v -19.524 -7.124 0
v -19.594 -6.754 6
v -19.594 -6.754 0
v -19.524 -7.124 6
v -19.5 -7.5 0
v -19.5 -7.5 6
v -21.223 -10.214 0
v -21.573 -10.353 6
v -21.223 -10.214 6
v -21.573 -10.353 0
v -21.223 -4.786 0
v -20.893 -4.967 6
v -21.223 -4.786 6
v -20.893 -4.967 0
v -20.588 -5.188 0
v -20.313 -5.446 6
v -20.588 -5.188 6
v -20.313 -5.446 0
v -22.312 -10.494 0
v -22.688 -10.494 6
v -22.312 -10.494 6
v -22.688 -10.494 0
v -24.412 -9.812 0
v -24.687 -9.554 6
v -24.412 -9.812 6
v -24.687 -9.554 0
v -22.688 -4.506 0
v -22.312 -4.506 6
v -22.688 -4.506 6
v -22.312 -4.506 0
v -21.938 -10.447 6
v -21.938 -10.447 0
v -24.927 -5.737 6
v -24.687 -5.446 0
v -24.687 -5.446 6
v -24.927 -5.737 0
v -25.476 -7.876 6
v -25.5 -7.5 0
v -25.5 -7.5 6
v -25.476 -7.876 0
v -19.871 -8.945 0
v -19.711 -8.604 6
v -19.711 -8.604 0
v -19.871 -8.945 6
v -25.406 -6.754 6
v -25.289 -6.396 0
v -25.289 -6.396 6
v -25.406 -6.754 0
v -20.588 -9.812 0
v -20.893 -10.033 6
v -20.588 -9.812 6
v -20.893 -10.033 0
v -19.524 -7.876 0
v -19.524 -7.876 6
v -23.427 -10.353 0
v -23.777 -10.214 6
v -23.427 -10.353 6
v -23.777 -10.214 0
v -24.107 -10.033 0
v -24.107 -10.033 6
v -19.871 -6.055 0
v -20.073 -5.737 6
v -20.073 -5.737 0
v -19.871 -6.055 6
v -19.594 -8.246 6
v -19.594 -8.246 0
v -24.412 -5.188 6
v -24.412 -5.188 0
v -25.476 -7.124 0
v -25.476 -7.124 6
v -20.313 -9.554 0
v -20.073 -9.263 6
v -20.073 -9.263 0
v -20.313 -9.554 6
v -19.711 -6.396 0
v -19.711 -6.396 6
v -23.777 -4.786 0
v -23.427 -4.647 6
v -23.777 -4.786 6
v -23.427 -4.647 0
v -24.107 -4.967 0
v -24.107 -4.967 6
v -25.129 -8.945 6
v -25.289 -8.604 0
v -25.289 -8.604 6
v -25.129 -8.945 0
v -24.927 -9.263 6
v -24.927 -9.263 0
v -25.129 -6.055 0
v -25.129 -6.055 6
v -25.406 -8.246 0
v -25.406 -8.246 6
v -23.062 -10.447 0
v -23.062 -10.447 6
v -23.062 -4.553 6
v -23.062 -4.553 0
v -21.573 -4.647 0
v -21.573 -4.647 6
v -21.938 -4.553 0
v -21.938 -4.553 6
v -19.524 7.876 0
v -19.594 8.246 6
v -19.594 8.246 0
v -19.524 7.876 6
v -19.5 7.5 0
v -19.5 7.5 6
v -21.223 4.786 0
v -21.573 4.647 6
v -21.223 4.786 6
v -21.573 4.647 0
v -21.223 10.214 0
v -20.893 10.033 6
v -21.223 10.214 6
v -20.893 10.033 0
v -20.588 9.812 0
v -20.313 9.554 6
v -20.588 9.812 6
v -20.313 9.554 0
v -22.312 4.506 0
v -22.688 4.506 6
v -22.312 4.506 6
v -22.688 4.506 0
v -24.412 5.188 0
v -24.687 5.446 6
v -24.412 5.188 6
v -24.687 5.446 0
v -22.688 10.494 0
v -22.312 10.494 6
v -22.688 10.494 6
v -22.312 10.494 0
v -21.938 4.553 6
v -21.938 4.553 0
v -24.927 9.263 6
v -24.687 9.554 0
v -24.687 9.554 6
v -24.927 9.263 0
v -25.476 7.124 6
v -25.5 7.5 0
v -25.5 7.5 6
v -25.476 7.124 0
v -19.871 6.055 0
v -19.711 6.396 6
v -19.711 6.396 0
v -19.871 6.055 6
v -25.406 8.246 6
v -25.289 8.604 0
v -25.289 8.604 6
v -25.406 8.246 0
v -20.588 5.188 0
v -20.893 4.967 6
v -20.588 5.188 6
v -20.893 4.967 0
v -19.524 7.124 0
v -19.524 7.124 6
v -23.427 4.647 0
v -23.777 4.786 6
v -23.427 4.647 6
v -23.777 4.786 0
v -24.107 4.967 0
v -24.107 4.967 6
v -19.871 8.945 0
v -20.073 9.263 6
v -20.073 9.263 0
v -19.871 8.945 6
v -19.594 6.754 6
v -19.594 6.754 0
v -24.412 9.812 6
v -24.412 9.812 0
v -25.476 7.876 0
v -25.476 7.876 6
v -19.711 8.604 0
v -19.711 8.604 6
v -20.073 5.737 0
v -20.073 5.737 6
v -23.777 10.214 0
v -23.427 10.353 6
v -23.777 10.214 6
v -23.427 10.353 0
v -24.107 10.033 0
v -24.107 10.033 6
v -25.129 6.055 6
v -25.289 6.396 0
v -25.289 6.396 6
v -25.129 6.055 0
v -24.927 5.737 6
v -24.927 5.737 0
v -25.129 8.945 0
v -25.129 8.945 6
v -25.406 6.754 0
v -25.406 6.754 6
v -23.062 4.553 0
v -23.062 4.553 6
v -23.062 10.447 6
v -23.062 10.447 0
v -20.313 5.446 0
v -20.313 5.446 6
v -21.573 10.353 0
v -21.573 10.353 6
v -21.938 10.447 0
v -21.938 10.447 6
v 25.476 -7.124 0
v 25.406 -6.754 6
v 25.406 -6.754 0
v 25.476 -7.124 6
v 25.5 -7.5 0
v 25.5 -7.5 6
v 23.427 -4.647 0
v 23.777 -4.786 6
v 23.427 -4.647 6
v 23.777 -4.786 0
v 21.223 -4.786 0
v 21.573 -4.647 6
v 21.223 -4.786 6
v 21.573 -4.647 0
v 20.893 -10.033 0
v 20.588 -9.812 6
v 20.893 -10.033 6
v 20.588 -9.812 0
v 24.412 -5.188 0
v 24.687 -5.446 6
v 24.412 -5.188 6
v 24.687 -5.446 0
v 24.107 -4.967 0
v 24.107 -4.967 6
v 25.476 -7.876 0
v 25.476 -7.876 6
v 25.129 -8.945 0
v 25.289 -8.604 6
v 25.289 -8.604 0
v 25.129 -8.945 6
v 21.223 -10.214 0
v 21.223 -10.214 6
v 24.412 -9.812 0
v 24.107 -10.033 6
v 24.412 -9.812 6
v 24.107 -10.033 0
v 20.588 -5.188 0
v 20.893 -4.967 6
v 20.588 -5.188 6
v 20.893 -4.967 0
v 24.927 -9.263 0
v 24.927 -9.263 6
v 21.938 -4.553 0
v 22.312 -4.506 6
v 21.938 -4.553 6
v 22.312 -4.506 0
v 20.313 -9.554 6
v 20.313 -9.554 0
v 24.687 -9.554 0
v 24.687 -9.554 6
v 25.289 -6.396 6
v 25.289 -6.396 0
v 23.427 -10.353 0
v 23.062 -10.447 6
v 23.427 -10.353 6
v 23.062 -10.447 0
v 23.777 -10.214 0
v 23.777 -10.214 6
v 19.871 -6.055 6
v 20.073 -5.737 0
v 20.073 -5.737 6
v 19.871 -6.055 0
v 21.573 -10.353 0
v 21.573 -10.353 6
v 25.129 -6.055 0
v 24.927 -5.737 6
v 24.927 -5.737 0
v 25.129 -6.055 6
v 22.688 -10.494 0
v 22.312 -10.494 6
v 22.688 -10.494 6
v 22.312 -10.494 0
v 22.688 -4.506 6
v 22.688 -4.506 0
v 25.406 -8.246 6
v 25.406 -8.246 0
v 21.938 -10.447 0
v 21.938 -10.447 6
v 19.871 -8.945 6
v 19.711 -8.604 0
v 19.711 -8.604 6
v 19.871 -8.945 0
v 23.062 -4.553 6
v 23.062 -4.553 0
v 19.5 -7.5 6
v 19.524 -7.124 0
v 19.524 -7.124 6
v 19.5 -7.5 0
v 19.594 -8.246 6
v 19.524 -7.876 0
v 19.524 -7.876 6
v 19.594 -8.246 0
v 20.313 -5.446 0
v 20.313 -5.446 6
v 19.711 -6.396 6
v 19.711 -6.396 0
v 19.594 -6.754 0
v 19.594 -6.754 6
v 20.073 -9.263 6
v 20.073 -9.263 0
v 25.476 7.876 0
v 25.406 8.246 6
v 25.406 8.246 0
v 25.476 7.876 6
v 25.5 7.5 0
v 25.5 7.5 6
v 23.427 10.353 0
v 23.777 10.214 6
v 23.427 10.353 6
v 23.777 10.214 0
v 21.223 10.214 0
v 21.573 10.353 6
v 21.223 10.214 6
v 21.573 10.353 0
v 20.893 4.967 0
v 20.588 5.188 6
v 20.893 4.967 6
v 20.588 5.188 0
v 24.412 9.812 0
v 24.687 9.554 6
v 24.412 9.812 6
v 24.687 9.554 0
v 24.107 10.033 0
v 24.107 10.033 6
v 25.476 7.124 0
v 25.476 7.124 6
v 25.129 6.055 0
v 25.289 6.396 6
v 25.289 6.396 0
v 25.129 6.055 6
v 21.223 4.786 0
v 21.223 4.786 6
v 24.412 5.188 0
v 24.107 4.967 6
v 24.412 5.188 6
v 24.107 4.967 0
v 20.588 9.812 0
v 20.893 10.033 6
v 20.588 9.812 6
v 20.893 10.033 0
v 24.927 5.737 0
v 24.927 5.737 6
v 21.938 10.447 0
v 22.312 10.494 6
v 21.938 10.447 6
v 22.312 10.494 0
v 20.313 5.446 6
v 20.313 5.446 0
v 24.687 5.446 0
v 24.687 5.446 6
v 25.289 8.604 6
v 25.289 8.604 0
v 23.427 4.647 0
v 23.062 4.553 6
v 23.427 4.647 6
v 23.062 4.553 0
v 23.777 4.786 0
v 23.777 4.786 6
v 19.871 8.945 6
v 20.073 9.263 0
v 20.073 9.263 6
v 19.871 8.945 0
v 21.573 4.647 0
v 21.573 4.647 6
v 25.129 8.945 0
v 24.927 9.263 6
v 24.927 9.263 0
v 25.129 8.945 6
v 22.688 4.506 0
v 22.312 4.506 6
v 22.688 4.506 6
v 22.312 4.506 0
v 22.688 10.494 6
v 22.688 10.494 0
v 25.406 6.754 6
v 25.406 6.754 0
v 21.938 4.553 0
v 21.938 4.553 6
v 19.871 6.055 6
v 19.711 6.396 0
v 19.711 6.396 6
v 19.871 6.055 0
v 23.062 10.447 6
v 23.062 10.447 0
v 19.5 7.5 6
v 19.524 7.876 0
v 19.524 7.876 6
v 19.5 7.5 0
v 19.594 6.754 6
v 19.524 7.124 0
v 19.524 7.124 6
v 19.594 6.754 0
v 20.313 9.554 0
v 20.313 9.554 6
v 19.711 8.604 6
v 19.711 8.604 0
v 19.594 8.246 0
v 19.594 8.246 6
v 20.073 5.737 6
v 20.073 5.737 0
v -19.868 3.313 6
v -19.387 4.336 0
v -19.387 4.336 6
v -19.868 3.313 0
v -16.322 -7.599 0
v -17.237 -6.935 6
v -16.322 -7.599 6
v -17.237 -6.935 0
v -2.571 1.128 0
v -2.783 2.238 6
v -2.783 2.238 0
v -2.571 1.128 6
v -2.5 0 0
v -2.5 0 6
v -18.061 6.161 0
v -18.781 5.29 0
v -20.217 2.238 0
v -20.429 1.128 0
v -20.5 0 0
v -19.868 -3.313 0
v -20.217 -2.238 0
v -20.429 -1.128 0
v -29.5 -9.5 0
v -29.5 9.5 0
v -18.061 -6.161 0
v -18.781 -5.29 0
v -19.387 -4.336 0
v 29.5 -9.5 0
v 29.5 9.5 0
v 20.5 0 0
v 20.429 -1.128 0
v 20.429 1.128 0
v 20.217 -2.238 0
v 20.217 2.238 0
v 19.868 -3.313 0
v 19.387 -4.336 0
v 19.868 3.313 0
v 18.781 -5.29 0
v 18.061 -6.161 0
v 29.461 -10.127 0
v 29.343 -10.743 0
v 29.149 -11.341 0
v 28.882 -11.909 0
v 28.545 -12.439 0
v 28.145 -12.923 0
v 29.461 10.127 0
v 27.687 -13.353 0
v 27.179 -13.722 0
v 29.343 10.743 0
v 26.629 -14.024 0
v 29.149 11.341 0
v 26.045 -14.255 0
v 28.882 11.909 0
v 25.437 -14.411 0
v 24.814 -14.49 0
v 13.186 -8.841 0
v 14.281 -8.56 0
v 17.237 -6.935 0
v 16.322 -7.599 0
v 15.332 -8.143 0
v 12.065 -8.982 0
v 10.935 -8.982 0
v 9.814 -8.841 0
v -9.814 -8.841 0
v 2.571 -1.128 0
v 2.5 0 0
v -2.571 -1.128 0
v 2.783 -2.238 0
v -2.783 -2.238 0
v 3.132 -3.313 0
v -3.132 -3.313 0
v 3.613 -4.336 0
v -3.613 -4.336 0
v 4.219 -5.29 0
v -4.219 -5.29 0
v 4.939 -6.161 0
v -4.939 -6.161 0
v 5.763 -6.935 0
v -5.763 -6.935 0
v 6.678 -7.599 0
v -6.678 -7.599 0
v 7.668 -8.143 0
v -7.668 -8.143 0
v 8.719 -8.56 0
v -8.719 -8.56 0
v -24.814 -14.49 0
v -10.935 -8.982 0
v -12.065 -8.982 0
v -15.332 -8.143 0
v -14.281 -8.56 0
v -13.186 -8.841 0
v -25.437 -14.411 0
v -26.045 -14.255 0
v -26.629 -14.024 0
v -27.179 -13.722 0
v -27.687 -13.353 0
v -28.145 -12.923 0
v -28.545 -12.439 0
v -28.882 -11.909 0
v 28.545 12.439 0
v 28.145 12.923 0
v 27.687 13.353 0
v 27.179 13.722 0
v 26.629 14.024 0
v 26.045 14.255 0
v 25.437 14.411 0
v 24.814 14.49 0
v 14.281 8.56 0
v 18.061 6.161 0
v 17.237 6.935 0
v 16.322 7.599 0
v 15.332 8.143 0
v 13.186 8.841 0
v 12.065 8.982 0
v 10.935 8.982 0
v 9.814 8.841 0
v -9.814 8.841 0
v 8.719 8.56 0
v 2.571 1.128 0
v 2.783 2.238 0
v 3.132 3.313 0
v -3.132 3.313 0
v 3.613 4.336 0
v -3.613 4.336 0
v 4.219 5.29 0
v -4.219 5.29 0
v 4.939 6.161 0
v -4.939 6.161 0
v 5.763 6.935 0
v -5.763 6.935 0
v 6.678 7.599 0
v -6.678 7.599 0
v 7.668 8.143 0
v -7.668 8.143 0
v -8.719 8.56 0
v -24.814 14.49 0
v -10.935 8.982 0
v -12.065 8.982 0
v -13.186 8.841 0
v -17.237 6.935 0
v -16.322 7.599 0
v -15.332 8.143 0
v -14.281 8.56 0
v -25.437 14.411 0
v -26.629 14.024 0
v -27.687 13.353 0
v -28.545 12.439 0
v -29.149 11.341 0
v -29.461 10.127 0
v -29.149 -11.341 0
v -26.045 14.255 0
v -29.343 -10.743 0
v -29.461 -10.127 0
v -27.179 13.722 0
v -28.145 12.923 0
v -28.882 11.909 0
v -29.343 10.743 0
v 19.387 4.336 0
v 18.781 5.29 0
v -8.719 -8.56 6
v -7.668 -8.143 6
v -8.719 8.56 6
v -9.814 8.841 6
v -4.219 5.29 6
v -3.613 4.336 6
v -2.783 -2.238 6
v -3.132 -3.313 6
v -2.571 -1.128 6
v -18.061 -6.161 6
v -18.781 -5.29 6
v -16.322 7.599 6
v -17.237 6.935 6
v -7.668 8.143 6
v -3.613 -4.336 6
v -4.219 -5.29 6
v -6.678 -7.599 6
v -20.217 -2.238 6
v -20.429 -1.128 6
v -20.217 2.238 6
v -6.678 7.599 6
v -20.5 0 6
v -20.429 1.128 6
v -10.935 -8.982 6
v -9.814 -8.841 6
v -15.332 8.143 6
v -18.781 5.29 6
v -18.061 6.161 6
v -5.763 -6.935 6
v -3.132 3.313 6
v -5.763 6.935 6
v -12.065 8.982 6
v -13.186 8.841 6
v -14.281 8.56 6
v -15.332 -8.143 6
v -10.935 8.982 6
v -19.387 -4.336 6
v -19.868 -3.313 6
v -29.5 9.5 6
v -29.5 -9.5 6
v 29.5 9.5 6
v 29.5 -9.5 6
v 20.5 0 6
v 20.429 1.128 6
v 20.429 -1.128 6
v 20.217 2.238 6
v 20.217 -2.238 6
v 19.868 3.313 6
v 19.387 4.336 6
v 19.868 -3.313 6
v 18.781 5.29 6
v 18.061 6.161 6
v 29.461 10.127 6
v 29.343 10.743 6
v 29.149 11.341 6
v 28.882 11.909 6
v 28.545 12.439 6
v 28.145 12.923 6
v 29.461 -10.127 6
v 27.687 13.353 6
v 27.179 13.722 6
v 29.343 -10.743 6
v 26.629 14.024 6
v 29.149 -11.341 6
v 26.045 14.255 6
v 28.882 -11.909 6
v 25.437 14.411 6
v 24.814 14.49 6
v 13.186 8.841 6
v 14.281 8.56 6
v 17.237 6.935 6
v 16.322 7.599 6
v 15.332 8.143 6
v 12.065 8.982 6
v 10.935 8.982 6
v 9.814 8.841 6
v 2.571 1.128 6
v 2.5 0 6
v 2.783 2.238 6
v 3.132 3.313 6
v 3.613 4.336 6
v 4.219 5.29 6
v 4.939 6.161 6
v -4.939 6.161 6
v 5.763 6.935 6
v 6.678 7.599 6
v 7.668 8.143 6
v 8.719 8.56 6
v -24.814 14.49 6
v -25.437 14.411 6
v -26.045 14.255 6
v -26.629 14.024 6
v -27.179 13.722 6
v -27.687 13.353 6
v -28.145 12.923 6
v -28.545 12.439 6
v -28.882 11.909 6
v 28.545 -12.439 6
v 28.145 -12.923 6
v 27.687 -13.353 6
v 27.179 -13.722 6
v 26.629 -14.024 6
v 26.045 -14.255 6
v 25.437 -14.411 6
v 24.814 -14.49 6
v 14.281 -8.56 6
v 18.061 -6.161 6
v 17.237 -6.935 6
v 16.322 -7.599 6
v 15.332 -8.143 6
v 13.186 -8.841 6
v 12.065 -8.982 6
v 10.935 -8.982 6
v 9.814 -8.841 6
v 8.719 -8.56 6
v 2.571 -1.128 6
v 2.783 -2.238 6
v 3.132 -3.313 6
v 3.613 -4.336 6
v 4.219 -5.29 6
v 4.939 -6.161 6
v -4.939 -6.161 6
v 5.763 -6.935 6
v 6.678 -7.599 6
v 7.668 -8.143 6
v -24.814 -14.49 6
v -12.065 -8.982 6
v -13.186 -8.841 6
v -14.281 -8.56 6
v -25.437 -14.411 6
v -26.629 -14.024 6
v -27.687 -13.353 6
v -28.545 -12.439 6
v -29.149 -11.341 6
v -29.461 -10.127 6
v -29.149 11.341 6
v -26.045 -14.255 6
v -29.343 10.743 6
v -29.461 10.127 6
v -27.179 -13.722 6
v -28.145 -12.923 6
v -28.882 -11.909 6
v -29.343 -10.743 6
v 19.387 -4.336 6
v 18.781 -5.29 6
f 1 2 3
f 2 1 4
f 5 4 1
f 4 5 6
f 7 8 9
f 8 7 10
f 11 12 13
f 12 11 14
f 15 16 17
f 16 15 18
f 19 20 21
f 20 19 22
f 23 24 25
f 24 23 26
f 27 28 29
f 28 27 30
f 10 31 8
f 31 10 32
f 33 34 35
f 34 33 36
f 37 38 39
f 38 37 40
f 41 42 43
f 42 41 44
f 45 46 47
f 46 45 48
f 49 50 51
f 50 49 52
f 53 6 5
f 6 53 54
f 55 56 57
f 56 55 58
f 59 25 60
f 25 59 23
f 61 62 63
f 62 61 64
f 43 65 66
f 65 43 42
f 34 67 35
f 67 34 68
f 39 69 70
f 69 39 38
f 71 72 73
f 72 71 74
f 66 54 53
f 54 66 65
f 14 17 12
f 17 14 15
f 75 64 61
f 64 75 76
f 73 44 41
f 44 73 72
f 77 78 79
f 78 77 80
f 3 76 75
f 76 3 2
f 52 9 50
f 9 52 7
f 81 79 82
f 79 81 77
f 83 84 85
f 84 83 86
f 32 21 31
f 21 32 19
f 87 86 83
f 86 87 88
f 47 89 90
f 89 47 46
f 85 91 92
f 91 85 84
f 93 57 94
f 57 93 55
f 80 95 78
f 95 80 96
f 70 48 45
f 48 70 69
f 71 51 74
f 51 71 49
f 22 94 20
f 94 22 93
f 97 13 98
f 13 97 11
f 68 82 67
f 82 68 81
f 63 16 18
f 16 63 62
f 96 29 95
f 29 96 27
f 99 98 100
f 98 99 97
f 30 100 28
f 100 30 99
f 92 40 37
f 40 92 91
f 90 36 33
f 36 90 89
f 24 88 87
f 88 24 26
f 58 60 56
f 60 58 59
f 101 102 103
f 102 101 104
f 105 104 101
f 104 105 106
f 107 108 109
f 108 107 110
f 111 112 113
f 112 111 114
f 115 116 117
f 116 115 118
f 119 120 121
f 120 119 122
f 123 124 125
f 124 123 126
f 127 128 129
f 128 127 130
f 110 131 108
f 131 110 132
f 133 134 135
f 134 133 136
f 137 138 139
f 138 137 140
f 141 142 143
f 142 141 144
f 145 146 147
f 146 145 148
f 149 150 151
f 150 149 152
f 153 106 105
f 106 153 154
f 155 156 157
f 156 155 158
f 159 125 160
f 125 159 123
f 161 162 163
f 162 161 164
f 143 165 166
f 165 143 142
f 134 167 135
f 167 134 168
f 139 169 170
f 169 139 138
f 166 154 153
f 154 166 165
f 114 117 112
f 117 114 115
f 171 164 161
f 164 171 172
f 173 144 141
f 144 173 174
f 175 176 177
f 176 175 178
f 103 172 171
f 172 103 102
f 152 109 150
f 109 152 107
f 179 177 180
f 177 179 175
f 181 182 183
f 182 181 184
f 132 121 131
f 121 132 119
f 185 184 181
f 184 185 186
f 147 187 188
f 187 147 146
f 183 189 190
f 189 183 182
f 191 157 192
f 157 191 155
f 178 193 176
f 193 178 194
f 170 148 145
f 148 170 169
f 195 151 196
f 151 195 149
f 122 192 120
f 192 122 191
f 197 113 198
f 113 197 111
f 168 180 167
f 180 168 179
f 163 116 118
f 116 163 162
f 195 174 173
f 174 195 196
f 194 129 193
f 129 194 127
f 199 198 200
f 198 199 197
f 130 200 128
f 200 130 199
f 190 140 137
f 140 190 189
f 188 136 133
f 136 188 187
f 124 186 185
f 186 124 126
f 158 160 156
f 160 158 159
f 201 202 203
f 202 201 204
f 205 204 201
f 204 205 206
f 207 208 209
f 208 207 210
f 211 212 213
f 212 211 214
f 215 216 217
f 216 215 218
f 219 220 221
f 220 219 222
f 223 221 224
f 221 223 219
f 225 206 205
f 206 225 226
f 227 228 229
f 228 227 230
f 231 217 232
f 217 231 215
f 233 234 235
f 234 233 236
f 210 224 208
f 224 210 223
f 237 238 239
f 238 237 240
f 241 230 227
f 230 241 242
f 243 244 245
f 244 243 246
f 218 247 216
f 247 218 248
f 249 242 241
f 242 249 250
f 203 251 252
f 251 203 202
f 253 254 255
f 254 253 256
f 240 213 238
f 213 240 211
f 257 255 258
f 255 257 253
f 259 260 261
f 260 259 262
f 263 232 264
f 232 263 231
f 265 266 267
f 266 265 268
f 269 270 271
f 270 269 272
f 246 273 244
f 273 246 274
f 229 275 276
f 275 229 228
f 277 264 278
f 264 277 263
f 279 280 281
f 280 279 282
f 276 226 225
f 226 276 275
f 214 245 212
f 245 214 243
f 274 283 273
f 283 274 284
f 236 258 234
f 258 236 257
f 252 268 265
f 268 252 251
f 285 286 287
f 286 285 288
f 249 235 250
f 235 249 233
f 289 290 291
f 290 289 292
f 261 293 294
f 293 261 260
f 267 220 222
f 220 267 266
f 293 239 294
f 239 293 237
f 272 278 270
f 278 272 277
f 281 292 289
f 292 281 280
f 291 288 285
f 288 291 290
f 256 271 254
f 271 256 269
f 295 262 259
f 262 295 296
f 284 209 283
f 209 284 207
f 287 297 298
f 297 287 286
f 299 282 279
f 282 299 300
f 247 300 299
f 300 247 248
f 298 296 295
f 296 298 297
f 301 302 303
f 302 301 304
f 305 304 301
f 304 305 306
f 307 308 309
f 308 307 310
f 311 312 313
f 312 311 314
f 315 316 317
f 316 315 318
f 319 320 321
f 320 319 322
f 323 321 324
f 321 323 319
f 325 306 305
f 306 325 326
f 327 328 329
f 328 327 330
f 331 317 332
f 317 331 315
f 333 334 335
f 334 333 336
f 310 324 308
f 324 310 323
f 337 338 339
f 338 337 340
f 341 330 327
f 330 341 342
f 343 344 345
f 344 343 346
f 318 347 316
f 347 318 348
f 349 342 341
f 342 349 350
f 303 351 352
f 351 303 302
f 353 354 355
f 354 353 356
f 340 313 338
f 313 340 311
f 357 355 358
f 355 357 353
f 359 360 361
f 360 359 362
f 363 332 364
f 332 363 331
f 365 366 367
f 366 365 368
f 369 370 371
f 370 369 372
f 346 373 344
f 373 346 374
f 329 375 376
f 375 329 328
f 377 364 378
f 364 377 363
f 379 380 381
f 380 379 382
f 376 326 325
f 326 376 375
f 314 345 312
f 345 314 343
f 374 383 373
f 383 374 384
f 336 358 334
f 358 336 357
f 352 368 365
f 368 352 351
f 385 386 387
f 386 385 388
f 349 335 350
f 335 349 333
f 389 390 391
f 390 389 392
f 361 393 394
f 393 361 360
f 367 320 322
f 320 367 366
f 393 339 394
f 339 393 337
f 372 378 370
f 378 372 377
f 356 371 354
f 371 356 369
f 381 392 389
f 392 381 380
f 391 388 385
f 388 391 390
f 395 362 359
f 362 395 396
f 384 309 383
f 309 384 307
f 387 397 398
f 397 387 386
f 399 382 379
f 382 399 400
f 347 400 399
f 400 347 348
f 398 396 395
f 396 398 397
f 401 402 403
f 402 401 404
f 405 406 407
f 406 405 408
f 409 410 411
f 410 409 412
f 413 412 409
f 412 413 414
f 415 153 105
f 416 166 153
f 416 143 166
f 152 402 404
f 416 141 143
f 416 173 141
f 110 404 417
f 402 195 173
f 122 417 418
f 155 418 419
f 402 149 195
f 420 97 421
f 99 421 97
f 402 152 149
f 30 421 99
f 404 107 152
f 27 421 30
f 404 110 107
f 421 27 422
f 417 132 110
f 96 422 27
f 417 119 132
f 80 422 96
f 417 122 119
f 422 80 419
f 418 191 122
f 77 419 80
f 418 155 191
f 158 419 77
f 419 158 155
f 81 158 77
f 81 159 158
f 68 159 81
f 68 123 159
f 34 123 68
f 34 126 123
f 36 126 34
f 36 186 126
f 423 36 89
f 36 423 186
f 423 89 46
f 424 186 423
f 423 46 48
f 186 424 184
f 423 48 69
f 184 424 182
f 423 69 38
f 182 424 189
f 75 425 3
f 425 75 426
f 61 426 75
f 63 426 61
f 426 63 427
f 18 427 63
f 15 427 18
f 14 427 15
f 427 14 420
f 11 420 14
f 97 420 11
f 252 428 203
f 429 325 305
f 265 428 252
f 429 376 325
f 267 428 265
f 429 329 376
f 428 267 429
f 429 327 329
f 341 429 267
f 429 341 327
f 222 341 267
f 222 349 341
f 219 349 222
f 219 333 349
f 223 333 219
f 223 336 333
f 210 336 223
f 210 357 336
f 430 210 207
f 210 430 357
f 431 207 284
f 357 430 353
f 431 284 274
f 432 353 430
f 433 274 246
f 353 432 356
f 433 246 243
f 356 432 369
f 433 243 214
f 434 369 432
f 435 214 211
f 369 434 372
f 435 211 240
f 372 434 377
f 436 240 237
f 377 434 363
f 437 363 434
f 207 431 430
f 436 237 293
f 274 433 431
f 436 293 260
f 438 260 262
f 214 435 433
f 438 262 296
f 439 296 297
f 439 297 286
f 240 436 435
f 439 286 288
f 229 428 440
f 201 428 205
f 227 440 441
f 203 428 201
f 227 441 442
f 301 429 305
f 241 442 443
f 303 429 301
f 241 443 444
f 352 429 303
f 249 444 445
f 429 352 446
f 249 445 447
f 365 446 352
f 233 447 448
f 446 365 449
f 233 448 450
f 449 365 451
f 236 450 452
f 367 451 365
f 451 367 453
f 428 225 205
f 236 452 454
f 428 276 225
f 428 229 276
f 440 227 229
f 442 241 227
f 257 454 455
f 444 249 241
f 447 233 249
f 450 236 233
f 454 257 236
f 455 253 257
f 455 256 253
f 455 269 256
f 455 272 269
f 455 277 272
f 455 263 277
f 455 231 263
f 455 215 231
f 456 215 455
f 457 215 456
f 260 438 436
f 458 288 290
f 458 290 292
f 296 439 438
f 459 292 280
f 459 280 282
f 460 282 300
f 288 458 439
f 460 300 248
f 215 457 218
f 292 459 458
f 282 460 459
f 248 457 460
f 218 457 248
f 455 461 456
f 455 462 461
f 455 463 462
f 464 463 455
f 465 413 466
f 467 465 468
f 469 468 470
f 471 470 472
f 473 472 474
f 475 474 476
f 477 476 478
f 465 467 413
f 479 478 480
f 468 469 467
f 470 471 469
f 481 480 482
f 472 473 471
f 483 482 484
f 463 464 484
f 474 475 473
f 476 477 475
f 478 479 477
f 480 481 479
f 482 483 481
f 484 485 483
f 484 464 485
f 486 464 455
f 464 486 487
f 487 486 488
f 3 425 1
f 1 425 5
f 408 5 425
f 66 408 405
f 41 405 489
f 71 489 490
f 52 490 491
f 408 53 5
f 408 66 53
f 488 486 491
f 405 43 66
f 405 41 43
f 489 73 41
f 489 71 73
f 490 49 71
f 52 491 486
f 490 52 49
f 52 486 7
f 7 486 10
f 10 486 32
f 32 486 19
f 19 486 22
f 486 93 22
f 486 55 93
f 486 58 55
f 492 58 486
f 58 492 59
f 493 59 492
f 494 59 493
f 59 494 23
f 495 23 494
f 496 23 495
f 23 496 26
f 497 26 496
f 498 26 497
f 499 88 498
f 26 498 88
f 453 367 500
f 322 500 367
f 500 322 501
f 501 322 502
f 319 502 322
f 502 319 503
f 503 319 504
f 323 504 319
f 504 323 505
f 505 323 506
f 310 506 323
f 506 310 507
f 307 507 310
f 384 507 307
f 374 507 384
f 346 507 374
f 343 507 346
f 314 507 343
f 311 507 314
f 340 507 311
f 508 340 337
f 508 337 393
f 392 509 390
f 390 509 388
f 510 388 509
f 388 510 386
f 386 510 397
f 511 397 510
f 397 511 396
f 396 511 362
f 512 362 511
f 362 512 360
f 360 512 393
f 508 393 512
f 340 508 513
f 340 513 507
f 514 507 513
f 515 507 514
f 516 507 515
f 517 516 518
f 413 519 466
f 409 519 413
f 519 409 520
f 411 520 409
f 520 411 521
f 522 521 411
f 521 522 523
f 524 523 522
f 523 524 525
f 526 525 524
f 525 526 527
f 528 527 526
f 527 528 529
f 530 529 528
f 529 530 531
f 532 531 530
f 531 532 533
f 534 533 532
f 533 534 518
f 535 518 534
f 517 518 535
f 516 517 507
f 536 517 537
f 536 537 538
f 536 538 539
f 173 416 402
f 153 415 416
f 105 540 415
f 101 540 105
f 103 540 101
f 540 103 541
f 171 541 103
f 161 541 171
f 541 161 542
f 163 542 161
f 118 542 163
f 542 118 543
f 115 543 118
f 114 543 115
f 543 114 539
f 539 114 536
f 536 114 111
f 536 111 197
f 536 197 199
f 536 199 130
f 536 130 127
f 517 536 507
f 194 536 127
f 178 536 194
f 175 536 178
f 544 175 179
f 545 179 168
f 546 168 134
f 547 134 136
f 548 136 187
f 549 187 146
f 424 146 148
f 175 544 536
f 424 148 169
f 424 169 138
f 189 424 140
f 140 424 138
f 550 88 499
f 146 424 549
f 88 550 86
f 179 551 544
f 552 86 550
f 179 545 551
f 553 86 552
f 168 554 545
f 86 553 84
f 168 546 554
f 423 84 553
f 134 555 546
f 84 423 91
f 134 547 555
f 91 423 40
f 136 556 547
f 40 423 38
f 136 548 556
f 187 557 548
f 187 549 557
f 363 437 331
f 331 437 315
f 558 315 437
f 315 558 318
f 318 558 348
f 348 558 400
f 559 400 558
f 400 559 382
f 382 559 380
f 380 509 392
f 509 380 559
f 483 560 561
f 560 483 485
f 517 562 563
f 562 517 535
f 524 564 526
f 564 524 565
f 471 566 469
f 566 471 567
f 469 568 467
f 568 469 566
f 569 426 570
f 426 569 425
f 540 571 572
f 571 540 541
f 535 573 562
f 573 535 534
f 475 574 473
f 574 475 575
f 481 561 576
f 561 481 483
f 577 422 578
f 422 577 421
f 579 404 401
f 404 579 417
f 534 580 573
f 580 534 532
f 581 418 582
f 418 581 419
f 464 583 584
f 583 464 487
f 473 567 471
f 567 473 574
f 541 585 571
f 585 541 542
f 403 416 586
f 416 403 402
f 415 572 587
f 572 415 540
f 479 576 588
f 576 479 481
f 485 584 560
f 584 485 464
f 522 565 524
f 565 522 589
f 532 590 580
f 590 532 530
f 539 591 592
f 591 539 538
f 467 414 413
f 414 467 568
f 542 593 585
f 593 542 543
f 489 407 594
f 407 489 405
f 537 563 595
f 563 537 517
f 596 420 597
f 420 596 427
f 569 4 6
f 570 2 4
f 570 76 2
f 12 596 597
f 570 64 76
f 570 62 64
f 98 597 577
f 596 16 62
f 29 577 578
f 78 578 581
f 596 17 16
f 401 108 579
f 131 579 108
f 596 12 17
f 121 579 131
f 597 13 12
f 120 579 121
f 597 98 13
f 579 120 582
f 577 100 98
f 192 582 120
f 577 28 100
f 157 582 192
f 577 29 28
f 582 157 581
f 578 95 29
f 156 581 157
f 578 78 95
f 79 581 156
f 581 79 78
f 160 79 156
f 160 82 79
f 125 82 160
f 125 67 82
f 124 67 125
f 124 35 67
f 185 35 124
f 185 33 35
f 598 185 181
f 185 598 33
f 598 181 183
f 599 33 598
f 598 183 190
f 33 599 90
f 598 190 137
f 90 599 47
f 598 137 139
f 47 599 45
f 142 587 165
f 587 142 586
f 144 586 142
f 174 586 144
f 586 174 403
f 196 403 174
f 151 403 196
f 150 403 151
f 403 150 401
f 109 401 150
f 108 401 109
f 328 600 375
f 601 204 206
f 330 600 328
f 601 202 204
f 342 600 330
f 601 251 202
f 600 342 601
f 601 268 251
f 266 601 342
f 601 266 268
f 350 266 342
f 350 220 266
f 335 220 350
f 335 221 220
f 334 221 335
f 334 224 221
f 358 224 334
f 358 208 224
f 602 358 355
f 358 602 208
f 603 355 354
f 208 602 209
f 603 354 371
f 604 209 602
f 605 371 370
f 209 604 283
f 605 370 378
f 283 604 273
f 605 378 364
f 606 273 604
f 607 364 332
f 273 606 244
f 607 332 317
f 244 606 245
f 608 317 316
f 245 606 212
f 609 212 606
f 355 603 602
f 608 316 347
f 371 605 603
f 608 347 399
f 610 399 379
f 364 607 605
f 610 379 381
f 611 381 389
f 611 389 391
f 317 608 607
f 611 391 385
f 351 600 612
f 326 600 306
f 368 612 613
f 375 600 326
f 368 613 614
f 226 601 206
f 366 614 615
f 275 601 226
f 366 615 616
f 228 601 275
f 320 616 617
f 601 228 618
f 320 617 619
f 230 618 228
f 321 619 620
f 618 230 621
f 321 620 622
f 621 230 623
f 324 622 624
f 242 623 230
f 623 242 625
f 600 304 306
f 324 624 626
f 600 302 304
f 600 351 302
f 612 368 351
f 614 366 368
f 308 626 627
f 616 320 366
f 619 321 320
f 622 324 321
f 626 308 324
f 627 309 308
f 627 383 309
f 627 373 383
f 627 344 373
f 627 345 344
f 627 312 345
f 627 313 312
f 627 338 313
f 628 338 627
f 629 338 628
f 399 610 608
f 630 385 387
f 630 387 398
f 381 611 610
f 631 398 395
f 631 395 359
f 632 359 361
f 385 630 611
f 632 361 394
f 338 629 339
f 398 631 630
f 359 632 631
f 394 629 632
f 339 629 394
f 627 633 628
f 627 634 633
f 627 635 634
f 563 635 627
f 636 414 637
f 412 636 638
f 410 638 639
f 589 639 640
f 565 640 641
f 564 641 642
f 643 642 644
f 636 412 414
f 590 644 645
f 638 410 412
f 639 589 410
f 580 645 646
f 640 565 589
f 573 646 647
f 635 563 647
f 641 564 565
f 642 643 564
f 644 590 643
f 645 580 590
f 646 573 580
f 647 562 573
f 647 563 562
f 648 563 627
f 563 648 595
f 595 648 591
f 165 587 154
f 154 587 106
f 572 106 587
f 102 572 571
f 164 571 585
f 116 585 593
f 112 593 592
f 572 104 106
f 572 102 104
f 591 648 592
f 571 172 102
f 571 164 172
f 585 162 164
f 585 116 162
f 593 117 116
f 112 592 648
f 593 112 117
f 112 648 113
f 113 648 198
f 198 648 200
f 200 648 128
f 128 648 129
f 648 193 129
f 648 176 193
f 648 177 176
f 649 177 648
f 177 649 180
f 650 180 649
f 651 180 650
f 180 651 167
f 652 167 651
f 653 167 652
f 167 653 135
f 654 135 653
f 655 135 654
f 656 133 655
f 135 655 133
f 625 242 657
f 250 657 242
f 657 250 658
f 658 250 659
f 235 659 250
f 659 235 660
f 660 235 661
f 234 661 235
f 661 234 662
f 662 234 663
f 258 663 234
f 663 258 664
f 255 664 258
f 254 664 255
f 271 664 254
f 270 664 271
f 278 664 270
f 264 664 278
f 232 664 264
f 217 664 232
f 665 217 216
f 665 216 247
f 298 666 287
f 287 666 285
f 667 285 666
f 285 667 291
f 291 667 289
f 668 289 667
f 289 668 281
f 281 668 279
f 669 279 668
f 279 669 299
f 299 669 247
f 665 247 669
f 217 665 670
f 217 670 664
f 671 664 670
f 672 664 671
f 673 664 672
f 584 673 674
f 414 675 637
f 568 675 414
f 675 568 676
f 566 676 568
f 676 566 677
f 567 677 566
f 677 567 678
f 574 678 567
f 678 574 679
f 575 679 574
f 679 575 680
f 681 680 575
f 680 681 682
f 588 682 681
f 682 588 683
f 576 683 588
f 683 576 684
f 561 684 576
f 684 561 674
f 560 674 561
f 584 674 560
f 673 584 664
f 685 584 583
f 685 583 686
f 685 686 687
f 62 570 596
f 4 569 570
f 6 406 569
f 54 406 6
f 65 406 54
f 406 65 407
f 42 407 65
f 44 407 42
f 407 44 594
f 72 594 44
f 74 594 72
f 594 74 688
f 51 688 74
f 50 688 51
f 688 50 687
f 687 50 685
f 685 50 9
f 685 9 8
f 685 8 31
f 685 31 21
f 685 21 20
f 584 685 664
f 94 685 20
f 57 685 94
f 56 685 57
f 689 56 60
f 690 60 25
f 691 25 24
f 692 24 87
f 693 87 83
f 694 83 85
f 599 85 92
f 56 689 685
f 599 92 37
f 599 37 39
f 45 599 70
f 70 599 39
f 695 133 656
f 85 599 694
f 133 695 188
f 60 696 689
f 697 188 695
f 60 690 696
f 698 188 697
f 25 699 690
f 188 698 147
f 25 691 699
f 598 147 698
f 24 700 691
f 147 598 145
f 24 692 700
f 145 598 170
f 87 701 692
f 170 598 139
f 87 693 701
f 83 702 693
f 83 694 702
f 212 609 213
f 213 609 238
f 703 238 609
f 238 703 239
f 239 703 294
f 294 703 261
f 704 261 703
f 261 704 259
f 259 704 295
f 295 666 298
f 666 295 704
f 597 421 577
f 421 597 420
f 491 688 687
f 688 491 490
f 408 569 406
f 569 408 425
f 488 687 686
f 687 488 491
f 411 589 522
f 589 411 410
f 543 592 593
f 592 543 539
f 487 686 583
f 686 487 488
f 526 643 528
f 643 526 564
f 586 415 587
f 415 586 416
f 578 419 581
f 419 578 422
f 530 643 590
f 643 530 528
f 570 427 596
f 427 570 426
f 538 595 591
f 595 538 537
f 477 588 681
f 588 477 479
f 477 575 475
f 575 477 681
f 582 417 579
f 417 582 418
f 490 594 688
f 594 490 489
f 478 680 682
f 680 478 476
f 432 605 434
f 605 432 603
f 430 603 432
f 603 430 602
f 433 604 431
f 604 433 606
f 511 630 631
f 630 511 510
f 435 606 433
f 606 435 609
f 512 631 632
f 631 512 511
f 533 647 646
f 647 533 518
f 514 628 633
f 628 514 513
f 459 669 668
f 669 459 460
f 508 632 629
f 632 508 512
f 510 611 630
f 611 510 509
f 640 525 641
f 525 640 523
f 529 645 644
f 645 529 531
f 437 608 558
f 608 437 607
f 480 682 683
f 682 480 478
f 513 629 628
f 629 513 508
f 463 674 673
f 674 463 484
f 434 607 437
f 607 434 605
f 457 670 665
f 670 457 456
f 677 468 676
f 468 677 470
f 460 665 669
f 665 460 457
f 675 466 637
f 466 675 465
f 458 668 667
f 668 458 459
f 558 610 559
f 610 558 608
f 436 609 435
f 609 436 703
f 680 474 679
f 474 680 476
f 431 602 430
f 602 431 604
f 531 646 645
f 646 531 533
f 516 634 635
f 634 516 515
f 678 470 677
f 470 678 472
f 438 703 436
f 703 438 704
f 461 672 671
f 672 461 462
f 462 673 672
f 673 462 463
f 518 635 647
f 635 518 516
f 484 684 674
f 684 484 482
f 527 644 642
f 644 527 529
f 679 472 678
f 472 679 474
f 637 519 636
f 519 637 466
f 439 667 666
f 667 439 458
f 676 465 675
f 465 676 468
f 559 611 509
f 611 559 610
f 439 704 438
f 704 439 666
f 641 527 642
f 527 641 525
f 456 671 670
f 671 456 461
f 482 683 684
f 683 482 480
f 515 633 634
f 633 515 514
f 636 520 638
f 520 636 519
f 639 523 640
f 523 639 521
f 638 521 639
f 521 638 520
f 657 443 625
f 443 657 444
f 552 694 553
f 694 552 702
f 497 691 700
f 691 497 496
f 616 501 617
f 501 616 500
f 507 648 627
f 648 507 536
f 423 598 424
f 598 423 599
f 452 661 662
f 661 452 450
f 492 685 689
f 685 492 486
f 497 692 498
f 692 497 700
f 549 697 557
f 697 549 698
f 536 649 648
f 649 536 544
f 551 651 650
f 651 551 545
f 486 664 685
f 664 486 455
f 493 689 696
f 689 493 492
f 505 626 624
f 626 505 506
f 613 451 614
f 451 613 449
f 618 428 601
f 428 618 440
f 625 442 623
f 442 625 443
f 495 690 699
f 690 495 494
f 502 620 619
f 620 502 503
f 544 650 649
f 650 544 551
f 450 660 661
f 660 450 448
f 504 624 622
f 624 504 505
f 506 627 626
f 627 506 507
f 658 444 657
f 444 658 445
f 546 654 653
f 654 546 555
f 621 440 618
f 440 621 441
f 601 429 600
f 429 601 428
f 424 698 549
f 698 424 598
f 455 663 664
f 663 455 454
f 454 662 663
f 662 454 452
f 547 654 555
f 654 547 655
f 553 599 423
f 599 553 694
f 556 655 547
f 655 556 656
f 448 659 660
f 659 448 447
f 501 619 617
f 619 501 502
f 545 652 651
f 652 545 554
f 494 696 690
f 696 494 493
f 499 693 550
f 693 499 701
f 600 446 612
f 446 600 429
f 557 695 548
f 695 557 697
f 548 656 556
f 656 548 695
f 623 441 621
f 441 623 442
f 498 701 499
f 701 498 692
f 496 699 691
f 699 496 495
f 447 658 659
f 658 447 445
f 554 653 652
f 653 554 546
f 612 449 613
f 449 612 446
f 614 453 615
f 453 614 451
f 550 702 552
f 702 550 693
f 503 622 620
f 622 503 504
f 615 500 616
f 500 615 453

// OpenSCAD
$fn = 50;


difference() {
	union() {
		hull() {
			translate(v = [-24.5000000000, 9.5000000000, 0]) {
				cylinder(h = 6, r = 5);
			}
			translate(v = [24.5000000000, 9.5000000000, 0]) {
				cylinder(h = 6, r = 5);
			}
			translate(v = [-24.5000000000, -9.5000000000, 0]) {
				cylinder(h = 6, r = 5);
			}
			translate(v = [24.5000000000, -9.5000000000, 0]) {
				cylinder(h = 6, r = 5);
			}
		}
	}
	union() {
		#translate(v = [-22.5000000000, -7.5000000000, -100.0000000000]) {
			cylinder(h = 200, r = 3.0000000000);
		}
		#translate(v = [-22.5000000000, 7.5000000000, -100.0000000000]) {
			cylinder(h = 200, r = 3.0000000000);
		}
		#translate(v = [22.5000000000, -7.5000000000, -100.0000000000]) {
			cylinder(h = 200, r = 3.0000000000);
		}
		#translate(v = [22.5000000000, 7.5000000000, -100.0000000000]) {
			cylinder(h = 200, r = 3.0000000000);
		}
		#translate(v = [-11.5000000000, 0, 0]) {
			cylinder(h = 6, r = 9.0000000000);
		}
		#translate(v = [11.5000000000, 0, 0]) {
			cylinder(h = 6, r = 9.0000000000);
		}
	}
}
